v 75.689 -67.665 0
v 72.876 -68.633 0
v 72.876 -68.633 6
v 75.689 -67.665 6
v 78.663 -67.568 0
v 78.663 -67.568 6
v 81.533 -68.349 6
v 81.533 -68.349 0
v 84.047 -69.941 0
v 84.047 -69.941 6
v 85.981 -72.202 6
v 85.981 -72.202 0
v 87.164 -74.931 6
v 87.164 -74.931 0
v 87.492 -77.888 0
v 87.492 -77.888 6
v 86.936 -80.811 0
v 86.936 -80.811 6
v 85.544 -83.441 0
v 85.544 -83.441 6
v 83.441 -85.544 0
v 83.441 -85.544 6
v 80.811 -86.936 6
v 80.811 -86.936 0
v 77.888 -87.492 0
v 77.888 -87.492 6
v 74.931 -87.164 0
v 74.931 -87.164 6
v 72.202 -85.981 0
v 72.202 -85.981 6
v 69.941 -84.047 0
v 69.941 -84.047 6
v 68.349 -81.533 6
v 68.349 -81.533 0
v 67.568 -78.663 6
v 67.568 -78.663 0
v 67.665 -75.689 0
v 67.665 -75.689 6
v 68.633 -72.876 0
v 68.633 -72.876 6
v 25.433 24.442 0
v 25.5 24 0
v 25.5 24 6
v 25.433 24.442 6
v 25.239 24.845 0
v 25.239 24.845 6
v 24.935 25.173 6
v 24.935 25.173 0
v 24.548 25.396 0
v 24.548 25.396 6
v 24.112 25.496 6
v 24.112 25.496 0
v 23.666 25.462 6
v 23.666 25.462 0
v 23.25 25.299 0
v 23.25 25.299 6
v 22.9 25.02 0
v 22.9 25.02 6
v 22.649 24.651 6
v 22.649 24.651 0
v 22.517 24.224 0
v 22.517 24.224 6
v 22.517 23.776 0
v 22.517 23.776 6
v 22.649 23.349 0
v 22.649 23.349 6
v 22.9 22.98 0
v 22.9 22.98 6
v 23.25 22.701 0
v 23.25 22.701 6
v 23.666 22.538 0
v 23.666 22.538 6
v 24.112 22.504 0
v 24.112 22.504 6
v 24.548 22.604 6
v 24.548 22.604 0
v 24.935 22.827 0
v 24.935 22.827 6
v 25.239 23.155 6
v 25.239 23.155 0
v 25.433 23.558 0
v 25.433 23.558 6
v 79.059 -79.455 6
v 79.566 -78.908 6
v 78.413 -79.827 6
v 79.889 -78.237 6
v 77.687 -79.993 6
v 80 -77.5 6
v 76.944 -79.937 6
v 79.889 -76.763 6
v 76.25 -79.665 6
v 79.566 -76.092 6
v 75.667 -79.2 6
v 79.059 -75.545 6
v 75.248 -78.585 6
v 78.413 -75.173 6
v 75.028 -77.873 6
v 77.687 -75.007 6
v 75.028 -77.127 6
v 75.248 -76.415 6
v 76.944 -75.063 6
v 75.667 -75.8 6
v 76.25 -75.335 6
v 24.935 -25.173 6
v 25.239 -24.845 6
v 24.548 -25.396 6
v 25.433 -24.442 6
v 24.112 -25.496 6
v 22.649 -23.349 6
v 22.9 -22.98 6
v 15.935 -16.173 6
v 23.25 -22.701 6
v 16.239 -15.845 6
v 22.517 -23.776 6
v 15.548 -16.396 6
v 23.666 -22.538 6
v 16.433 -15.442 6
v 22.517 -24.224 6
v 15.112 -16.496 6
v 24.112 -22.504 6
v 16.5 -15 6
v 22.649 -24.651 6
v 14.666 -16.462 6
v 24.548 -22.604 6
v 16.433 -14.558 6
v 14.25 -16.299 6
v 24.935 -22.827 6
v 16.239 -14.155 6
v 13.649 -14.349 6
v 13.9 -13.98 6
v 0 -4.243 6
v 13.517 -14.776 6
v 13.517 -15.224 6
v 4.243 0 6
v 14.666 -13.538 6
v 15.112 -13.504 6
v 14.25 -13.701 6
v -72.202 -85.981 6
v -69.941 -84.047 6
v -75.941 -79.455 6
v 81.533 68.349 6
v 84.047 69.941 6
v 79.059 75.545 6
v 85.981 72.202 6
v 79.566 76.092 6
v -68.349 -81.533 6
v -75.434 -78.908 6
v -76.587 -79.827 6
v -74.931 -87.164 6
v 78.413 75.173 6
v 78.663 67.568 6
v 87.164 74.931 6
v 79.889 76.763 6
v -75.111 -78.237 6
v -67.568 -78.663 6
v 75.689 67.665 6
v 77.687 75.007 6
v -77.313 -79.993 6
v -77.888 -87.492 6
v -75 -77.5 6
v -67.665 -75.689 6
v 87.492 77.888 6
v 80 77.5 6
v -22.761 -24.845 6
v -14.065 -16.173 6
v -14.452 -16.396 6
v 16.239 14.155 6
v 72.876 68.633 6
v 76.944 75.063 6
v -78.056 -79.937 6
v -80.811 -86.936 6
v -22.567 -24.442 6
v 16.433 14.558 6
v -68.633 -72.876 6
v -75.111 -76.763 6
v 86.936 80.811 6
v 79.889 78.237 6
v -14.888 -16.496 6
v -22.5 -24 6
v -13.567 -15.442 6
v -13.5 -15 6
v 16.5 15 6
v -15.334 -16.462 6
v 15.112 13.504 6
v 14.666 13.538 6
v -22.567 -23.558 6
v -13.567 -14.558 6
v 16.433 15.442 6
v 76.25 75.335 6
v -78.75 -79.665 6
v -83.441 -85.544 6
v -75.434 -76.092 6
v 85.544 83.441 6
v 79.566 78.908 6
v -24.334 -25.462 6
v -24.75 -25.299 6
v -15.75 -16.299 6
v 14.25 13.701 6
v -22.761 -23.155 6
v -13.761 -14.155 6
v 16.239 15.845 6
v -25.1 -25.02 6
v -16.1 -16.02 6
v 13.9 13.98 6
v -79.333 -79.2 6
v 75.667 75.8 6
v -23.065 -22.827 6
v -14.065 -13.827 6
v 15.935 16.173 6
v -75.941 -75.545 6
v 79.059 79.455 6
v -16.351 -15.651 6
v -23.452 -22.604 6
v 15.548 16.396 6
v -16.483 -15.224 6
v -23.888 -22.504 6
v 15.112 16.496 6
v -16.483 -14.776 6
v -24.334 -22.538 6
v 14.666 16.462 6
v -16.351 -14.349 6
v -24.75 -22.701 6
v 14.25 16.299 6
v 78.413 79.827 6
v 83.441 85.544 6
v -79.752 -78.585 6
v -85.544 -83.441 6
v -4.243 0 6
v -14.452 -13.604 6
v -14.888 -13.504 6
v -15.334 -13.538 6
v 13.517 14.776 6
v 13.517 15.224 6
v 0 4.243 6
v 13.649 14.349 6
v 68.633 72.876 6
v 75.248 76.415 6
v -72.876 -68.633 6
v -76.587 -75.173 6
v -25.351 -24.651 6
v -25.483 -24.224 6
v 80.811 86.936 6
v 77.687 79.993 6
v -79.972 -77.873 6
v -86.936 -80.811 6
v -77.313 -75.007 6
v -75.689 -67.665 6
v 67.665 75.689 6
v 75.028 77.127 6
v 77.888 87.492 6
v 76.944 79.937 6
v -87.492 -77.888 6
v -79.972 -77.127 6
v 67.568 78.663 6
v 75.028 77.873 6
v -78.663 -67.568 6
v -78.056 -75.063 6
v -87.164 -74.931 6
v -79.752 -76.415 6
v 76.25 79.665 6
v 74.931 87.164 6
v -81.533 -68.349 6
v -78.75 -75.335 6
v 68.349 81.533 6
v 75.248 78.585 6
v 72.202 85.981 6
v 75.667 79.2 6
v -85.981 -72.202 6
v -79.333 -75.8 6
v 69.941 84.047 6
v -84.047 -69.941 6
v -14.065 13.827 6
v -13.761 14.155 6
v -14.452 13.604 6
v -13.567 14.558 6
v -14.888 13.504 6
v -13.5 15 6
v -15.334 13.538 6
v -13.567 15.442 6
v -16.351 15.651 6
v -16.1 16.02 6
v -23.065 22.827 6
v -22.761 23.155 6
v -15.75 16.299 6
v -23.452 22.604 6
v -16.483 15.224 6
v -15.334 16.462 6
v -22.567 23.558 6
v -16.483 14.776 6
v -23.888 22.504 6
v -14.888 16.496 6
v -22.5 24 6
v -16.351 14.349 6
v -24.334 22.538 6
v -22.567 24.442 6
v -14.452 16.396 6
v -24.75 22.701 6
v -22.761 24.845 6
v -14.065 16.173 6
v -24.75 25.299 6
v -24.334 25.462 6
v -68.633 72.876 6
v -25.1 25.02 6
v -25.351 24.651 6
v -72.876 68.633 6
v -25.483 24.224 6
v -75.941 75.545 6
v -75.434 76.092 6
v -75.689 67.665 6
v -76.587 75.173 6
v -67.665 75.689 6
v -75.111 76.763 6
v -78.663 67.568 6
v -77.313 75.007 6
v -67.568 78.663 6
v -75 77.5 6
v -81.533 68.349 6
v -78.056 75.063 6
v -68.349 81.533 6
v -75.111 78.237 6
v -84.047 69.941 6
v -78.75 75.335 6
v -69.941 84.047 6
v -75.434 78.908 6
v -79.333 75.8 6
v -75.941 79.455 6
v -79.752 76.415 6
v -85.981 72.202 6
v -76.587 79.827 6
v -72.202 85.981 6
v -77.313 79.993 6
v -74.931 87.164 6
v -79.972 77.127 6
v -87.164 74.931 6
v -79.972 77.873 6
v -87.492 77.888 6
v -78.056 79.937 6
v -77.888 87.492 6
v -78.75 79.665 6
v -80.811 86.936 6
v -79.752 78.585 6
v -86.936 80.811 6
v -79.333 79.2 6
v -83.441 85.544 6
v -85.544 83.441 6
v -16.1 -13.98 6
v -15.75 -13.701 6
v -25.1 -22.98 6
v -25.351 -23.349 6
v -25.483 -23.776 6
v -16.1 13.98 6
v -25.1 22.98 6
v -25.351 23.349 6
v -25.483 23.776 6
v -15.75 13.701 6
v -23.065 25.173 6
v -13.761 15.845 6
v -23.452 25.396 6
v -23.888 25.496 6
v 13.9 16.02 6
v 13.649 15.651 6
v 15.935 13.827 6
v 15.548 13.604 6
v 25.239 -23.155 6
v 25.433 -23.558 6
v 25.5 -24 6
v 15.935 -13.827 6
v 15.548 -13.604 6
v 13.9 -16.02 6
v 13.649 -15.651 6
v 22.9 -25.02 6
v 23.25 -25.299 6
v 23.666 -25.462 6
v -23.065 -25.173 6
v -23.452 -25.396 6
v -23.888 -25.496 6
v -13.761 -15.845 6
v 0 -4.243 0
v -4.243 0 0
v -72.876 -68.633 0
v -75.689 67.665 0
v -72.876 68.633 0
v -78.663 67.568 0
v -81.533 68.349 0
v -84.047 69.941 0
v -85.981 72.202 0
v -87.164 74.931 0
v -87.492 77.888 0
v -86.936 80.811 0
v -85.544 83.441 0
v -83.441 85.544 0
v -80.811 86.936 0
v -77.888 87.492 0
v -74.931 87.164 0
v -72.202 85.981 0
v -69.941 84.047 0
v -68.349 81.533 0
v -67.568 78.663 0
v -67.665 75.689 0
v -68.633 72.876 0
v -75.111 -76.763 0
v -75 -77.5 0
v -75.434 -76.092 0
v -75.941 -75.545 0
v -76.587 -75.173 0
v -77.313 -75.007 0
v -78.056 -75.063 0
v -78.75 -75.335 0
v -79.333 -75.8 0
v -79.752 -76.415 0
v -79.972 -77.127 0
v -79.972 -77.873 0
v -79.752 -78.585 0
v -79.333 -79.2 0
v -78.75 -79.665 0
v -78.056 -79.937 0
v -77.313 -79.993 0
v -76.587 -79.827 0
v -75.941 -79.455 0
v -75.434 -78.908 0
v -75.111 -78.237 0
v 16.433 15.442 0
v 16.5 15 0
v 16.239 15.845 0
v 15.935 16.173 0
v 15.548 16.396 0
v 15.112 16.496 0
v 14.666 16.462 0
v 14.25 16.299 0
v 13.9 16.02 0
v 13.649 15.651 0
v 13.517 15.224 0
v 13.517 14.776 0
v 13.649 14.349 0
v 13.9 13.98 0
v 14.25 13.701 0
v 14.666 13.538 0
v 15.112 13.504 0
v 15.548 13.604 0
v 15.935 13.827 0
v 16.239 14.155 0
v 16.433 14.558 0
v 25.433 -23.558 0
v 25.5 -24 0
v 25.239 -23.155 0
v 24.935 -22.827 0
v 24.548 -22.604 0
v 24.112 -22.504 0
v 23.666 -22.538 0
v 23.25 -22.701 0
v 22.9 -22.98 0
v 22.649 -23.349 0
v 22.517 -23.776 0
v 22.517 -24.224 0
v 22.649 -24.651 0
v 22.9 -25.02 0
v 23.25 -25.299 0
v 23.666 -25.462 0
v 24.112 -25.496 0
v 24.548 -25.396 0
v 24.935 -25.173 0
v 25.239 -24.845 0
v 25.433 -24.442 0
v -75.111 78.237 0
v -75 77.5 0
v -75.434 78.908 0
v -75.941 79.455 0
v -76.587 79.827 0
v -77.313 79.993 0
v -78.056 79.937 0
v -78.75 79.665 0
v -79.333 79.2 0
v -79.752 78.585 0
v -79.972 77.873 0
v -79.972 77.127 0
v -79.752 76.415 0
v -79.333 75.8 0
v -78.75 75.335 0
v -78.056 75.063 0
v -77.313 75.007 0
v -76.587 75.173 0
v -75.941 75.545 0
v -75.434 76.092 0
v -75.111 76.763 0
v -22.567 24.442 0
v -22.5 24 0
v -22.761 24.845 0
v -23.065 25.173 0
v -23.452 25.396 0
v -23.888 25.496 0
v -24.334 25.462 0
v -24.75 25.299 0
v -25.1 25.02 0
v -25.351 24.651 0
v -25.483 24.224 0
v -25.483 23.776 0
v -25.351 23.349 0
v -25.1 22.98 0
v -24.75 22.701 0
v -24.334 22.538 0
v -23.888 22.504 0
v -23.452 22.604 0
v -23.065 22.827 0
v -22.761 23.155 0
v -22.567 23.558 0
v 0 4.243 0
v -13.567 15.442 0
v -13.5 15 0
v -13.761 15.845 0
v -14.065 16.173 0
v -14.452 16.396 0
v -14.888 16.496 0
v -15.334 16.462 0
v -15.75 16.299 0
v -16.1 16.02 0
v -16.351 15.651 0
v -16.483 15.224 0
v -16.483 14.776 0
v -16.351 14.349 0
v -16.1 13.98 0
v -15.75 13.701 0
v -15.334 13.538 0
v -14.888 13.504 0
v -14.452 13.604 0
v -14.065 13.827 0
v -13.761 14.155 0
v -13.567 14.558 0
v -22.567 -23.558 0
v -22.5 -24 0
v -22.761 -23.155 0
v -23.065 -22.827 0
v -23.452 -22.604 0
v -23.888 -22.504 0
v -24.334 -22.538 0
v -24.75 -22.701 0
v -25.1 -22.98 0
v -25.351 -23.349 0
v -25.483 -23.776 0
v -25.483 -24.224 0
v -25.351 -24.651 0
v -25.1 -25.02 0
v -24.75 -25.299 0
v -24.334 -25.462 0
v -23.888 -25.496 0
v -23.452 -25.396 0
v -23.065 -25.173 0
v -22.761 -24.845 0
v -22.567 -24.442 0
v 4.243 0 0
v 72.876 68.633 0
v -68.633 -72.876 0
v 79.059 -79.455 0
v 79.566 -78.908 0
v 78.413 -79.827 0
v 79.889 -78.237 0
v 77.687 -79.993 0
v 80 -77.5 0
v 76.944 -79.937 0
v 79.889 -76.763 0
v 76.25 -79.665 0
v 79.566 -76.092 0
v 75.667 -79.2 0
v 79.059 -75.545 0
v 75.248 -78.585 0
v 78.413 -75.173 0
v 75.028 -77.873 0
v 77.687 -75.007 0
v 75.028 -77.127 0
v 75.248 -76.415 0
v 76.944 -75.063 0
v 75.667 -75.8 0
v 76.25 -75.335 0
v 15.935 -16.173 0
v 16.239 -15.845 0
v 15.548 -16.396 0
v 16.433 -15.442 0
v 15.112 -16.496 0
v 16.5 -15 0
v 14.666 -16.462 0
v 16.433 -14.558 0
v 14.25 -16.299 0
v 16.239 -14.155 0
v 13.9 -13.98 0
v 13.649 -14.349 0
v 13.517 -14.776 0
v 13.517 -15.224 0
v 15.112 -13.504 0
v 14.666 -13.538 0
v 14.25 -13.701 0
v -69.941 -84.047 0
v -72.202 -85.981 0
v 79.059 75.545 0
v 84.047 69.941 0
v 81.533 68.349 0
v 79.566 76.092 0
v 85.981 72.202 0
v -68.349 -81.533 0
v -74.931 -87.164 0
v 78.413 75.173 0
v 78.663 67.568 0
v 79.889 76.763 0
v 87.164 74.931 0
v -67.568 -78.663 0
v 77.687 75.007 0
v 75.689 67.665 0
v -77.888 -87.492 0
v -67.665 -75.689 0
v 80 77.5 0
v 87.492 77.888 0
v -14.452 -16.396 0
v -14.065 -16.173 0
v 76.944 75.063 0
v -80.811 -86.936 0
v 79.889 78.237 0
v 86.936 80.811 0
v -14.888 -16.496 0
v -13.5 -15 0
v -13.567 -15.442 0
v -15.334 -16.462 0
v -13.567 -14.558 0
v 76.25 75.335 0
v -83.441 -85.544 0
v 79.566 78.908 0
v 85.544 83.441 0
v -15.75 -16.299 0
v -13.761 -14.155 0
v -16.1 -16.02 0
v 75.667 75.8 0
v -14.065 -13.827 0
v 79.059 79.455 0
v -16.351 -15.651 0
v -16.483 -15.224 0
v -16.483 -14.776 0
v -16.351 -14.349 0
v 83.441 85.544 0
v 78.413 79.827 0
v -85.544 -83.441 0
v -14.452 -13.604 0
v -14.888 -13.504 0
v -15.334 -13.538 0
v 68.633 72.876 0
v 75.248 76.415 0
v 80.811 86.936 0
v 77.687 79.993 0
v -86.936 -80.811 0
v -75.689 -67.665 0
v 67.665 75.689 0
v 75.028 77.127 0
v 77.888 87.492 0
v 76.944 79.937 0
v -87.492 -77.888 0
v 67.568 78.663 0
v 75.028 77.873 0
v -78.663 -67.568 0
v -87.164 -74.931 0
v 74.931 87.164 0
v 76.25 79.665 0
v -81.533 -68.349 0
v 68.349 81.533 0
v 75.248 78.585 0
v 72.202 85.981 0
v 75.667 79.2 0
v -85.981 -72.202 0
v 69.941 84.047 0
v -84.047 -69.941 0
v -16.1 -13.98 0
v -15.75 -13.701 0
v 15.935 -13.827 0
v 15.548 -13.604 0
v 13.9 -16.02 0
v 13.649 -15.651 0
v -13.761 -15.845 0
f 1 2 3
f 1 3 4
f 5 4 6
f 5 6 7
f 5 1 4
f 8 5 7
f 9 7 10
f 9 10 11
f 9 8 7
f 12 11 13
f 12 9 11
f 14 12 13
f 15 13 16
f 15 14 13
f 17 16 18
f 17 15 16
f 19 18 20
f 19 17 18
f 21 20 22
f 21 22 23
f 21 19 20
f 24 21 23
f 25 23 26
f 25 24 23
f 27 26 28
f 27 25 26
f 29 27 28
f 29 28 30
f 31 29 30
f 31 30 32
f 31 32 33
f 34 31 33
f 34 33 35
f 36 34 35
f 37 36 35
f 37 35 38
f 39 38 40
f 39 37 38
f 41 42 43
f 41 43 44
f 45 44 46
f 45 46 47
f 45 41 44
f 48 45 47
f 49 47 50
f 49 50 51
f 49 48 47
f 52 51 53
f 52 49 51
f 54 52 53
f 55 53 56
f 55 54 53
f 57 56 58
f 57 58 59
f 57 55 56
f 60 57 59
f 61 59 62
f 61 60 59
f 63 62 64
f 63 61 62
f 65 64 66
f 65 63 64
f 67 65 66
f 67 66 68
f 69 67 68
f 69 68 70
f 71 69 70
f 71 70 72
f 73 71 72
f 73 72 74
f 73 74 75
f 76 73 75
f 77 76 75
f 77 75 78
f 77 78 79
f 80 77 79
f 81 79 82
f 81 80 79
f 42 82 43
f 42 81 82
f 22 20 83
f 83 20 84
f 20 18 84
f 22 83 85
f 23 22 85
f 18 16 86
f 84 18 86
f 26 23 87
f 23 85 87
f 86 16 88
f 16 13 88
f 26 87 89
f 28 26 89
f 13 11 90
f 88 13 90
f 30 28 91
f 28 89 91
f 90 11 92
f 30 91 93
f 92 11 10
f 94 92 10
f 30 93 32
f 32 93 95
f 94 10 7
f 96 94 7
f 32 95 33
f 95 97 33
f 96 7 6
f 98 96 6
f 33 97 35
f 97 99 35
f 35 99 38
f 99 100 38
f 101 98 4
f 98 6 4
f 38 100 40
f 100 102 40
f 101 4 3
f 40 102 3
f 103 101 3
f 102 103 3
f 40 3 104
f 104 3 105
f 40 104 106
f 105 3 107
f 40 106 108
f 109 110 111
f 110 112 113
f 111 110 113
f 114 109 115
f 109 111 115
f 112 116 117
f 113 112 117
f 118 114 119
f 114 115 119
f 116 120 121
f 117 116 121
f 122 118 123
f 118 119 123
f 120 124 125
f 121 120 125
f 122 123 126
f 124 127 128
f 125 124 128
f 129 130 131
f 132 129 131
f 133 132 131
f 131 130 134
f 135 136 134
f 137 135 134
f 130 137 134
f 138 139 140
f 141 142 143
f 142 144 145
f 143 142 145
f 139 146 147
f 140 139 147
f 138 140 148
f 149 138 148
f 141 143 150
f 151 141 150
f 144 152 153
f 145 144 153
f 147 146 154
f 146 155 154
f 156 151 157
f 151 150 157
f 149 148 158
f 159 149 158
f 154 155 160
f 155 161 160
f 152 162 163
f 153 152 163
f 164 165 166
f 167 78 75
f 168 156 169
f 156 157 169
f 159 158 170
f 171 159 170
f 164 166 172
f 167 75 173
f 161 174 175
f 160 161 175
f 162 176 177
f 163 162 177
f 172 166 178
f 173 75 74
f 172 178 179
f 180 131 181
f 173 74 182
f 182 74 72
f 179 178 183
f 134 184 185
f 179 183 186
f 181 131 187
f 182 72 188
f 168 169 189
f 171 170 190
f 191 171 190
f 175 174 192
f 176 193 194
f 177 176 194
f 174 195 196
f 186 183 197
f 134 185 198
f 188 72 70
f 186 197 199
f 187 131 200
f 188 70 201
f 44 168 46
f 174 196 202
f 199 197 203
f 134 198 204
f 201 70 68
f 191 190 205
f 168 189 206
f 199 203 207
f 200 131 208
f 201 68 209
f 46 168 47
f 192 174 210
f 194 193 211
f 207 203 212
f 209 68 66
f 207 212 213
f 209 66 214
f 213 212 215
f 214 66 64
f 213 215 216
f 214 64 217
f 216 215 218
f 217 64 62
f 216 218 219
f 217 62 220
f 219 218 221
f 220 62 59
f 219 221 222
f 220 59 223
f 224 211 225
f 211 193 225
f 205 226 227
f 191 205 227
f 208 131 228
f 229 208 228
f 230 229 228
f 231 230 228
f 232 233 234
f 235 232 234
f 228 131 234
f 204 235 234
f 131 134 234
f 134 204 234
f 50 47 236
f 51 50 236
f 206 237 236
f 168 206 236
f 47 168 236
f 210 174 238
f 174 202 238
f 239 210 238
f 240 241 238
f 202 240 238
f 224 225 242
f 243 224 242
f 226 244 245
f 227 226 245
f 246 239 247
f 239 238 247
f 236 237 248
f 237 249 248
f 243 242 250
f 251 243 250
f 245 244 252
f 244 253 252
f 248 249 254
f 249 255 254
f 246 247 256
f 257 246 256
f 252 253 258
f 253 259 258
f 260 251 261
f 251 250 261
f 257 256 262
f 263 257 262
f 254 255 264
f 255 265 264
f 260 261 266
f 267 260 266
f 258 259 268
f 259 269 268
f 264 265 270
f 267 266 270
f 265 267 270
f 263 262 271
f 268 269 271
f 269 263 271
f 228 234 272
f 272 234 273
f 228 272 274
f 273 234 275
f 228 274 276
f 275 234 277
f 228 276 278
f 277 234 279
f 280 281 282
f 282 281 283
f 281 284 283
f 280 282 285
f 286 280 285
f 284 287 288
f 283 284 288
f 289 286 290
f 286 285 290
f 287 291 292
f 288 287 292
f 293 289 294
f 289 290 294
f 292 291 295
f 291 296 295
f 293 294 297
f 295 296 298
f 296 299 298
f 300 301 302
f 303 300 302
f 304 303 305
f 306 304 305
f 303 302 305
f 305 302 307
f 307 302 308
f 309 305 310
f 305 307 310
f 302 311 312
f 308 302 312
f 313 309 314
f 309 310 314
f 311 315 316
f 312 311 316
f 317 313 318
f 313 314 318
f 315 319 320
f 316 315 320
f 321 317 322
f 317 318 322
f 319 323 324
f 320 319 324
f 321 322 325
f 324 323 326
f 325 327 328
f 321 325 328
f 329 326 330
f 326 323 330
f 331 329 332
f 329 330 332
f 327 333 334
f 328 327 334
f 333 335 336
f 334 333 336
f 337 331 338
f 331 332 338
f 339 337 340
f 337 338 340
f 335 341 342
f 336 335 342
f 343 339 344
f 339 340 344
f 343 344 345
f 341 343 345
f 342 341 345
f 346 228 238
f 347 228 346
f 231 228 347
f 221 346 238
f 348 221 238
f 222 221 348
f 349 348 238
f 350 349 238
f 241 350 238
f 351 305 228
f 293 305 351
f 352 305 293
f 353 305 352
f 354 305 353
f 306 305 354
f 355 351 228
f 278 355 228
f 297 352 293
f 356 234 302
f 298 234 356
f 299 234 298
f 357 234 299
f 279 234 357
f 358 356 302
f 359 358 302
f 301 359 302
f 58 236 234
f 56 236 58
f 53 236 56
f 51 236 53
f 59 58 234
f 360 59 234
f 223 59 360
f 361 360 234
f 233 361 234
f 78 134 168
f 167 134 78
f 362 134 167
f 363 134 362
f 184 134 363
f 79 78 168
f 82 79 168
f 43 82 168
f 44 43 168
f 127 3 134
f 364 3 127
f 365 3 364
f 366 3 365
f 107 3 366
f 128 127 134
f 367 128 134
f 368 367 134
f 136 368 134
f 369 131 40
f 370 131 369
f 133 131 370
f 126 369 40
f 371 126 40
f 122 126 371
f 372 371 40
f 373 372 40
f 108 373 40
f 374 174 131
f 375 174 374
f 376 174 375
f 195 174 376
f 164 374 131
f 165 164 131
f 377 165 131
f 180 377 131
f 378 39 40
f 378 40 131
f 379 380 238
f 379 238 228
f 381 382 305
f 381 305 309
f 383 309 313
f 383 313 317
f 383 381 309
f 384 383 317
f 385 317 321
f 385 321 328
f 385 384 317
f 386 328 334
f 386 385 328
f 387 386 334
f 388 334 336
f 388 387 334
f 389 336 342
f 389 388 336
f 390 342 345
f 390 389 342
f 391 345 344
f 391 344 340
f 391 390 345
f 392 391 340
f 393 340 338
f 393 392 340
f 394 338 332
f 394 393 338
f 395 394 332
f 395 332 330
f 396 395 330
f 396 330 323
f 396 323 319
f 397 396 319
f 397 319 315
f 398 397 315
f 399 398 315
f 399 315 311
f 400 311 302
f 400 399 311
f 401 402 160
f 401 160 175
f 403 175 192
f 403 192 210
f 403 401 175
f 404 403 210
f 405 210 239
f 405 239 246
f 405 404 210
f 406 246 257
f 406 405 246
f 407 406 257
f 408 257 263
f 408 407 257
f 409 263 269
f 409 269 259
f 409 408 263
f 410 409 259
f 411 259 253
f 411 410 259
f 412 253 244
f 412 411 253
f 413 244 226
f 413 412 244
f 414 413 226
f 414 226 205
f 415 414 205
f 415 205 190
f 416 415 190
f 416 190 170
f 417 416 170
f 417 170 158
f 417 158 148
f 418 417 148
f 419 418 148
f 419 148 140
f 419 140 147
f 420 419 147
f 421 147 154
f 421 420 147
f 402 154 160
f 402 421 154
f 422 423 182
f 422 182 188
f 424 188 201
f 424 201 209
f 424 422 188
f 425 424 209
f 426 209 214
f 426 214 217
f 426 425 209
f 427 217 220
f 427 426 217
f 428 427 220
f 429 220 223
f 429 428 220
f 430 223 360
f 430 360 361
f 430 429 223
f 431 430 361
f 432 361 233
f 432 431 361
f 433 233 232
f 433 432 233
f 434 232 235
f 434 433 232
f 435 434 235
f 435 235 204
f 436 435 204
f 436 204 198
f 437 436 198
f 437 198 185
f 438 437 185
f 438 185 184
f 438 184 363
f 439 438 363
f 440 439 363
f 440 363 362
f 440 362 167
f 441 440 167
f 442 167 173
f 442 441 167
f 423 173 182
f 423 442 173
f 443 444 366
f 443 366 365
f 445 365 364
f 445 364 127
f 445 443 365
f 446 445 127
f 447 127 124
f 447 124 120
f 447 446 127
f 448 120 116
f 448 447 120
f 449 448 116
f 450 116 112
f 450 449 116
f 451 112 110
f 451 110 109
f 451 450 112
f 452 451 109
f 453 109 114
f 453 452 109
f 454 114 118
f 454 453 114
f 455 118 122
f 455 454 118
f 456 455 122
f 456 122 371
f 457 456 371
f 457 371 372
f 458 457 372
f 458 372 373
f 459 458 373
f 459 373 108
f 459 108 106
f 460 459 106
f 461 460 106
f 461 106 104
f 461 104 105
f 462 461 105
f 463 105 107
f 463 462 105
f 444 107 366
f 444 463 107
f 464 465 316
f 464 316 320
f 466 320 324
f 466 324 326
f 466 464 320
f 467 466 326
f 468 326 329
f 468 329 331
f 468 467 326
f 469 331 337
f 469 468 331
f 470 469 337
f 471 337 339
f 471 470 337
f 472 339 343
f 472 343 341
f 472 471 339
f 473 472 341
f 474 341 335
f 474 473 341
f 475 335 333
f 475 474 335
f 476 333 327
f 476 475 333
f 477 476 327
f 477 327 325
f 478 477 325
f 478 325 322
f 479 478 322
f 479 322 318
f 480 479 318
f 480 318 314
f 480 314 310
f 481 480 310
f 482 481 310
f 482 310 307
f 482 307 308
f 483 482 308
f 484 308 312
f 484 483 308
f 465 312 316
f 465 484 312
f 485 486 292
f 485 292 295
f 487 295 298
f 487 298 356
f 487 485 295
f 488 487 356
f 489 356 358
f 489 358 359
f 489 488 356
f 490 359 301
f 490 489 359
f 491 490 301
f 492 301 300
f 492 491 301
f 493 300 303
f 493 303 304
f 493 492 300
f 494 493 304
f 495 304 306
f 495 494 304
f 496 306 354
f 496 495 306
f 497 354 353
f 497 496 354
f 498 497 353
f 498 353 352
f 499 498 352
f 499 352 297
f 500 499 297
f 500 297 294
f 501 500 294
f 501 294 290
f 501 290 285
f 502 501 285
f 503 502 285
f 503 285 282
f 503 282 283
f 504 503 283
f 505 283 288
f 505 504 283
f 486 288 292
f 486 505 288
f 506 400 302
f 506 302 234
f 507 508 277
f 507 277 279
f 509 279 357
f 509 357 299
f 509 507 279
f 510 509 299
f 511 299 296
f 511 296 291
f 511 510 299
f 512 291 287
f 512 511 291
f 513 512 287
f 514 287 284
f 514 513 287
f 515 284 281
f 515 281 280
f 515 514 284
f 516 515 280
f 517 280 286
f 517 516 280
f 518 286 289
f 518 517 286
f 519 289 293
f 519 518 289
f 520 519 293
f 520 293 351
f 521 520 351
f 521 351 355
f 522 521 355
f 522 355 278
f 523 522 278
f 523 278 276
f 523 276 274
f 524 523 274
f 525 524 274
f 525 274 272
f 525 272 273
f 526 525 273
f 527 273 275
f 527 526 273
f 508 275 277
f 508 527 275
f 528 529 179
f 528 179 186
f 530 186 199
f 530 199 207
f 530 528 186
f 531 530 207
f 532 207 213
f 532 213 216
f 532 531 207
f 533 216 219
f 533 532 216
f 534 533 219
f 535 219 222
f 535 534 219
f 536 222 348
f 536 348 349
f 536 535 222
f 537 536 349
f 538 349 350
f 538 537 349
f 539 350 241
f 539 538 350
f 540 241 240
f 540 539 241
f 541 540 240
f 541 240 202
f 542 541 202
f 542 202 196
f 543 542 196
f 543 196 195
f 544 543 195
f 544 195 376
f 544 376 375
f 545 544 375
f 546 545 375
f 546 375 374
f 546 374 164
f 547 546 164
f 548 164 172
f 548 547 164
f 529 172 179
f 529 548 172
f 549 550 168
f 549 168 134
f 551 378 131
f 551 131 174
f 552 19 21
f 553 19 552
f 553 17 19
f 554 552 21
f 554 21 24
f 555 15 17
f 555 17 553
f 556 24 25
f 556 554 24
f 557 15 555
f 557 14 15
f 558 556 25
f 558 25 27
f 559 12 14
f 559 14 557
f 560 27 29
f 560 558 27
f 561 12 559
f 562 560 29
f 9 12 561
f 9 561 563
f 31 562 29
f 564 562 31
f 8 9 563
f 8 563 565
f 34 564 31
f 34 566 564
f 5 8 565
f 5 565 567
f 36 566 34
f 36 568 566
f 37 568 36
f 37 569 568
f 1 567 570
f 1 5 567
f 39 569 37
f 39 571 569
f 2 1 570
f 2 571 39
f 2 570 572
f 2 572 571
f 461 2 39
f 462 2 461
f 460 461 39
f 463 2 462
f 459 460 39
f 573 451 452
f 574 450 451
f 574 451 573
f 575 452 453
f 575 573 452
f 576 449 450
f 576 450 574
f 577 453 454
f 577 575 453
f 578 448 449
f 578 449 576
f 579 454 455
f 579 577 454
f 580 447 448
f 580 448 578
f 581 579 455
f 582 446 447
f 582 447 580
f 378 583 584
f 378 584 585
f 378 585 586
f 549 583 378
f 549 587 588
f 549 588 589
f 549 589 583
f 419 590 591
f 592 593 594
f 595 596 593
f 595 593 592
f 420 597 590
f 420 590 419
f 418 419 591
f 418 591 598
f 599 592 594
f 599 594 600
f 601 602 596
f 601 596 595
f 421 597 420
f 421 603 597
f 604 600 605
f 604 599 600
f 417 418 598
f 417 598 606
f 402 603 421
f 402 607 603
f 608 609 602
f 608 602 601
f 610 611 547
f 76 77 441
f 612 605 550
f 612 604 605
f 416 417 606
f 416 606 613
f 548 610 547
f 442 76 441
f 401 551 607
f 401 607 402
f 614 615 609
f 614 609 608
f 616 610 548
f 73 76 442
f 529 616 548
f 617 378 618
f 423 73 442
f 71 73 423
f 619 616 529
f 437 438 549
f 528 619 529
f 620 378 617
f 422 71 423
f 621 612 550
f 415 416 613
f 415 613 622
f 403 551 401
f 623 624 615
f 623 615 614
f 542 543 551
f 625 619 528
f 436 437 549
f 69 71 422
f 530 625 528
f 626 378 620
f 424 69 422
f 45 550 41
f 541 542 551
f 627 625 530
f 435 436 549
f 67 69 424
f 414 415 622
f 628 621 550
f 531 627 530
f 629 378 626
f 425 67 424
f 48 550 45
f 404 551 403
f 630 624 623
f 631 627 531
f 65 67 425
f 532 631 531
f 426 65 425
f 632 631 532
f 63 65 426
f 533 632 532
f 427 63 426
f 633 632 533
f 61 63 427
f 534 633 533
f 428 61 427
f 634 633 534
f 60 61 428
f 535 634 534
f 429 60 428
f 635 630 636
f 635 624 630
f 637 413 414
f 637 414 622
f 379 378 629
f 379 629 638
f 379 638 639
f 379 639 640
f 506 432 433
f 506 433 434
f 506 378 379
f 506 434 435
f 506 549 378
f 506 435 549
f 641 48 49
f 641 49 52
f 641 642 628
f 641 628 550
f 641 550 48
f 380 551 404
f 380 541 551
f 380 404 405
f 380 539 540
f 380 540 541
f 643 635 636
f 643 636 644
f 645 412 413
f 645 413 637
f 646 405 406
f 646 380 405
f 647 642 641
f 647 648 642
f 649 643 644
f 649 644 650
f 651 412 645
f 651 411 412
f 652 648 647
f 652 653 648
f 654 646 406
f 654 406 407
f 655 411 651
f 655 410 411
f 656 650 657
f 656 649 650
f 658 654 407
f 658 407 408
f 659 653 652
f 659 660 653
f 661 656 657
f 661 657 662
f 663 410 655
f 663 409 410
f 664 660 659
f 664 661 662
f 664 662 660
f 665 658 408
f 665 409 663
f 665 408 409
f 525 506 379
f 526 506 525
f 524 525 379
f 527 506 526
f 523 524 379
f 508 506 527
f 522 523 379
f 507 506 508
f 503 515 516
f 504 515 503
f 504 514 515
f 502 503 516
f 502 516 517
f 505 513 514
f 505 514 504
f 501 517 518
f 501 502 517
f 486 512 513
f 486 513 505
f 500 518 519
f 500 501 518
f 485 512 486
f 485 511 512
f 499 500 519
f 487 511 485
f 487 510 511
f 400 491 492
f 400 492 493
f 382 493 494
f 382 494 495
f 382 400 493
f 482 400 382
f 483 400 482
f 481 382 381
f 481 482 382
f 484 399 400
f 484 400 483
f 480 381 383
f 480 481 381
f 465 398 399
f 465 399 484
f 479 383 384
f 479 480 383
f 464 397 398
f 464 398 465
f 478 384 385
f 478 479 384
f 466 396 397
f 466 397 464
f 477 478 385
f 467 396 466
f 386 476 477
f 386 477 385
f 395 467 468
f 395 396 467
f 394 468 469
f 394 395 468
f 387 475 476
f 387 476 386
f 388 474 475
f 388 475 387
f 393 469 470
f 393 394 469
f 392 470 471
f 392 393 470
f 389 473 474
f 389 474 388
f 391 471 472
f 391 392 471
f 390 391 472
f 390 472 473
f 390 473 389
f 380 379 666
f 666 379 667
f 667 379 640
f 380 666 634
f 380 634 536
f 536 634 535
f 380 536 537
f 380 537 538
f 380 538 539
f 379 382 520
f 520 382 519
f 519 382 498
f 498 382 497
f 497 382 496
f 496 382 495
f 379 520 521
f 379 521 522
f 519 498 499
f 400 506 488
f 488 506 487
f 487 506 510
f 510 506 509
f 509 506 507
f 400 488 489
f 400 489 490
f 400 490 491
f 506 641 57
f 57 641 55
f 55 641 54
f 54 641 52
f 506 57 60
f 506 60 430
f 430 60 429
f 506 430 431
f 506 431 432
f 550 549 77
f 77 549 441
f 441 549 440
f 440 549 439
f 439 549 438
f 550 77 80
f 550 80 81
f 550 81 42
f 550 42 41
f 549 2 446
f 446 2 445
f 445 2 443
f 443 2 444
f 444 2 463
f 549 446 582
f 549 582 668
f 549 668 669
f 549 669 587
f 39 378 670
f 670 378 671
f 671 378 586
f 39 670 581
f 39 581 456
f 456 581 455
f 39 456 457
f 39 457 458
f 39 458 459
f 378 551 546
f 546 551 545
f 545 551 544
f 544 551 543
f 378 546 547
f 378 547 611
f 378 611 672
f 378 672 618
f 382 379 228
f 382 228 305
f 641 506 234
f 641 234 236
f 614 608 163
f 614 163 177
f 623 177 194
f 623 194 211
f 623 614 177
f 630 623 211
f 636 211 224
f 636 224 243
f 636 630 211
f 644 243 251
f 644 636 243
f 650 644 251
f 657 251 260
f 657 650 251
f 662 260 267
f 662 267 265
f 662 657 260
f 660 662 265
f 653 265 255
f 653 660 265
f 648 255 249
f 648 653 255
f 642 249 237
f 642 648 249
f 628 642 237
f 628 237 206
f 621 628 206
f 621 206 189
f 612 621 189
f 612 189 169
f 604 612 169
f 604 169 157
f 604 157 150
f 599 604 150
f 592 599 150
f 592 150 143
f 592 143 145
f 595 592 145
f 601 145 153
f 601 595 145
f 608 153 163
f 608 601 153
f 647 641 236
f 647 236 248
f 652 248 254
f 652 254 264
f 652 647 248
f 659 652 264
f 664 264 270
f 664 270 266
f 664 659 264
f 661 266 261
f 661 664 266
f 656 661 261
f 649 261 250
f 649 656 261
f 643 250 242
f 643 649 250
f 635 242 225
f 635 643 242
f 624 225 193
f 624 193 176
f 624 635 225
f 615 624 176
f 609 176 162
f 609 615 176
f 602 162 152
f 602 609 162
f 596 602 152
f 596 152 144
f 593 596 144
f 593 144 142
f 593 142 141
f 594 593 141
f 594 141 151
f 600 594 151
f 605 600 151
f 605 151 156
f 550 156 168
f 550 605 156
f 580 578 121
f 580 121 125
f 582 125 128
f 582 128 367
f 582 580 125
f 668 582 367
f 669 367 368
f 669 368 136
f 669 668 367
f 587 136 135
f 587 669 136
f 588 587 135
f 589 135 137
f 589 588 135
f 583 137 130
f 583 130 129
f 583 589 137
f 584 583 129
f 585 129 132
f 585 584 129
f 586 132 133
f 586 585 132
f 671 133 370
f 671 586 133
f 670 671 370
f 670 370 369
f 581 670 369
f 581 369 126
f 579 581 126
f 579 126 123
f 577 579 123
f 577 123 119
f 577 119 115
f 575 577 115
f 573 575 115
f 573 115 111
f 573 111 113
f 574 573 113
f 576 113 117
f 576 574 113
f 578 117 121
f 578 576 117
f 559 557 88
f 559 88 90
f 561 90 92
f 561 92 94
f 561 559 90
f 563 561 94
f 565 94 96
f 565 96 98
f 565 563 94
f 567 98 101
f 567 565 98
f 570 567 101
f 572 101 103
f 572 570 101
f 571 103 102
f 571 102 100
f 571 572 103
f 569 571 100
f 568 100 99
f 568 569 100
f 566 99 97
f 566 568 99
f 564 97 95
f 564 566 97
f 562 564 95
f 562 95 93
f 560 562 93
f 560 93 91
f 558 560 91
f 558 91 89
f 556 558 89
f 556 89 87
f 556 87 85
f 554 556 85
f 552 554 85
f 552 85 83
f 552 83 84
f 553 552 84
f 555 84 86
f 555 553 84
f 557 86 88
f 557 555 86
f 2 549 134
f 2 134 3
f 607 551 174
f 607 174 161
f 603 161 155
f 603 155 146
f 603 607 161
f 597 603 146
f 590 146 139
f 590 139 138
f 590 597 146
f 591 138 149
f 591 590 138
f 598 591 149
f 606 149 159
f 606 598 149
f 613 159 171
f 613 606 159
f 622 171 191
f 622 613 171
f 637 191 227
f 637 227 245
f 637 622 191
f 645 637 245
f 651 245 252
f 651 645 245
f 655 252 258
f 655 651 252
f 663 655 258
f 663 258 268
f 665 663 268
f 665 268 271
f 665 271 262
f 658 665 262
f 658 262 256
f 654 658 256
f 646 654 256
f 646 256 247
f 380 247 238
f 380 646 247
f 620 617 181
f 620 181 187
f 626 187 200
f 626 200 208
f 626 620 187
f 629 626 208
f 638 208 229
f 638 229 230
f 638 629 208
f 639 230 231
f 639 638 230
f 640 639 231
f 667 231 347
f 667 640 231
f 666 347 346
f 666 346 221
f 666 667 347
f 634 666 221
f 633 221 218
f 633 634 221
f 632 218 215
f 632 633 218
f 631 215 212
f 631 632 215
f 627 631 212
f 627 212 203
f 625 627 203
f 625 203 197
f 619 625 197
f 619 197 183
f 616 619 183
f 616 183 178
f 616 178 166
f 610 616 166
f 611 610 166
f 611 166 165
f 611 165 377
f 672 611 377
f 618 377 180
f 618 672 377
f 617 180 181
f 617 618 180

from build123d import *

# Parameters (mm, degrees)
SKETCH1_R           = 2.5
SKETCH1_R_2         = 1.5
BOSS_EXTRUDE1_DEPTH = 6


with BuildPart() as part:
    # Sketch1 → Boss-Extrude1 (new body)
    with BuildSketch(Plane.XY):
        with BuildLine():
            Line((-72.875951562, -68.633310875), (-4.242640687, 0))
            Line((-4.242640687, 0), (-72.875951562, 68.633310875))
            ThreePointArc((-72.875951562, 68.633310875), (-84.571067812, 84.571067812), (-68.633310875, 72.875951562))
            Line((-68.633310875, 72.875951562), (0, 4.242640687))
            Line((0, 4.242640687), (68.633310875, 72.875951562))
            ThreePointArc((68.633310875, 72.875951562), (84.571067812, 84.571067812), (72.875951562, 68.633310875))
            Line((72.875951562, 68.633310875), (4.242640687, 0))
            Line((4.242640687, 0), (72.875951562, -68.633310875))
            ThreePointArc((72.875951562, -68.633310875), (84.571067812, -84.571067812), (68.633310875, -72.875951562))
            Line((68.633310875, -72.875951562), (0, -4.242640687))
            Line((0, -4.242640687), (-68.633310875, -72.875951562))
            ThreePointArc((-68.633310875, -72.875951562), (-84.571067812, -84.571067812), (-72.875951562, -68.633310875))
        make_face()
        with Locations((-77.5, -77.5)):
            Circle(SKETCH1_R, mode=Mode.SUBTRACT)
        with Locations((-15, -15)):
            Circle(SKETCH1_R_2, mode=Mode.SUBTRACT)
        with Locations((-24, -24)):
            Circle(SKETCH1_R_2, mode=Mode.SUBTRACT)
        with Locations((-24, 24)):
            Circle(SKETCH1_R_2, mode=Mode.SUBTRACT)
        with Locations((-15, 15)):
            Circle(SKETCH1_R_2, mode=Mode.SUBTRACT)
        with Locations((-77.5, 77.5)):
            Circle(SKETCH1_R, mode=Mode.SUBTRACT)
        with Locations((24, 24)):
            Circle(SKETCH1_R_2, mode=Mode.SUBTRACT)
        with Locations((15, 15)):
            Circle(SKETCH1_R_2, mode=Mode.SUBTRACT)
        with Locations((77.5, 77.5)):
            Circle(SKETCH1_R, mode=Mode.SUBTRACT)
        with Locations((24, -24)):
            Circle(SKETCH1_R_2, mode=Mode.SUBTRACT)
        with Locations((15, -15)):
            Circle(SKETCH1_R_2, mode=Mode.SUBTRACT)
        with Locations((77.5, -77.5)):
            Circle(SKETCH1_R, mode=Mode.SUBTRACT)
    extrude(amount=BOSS_EXTRUDE1_DEPTH)


solid = part.part
